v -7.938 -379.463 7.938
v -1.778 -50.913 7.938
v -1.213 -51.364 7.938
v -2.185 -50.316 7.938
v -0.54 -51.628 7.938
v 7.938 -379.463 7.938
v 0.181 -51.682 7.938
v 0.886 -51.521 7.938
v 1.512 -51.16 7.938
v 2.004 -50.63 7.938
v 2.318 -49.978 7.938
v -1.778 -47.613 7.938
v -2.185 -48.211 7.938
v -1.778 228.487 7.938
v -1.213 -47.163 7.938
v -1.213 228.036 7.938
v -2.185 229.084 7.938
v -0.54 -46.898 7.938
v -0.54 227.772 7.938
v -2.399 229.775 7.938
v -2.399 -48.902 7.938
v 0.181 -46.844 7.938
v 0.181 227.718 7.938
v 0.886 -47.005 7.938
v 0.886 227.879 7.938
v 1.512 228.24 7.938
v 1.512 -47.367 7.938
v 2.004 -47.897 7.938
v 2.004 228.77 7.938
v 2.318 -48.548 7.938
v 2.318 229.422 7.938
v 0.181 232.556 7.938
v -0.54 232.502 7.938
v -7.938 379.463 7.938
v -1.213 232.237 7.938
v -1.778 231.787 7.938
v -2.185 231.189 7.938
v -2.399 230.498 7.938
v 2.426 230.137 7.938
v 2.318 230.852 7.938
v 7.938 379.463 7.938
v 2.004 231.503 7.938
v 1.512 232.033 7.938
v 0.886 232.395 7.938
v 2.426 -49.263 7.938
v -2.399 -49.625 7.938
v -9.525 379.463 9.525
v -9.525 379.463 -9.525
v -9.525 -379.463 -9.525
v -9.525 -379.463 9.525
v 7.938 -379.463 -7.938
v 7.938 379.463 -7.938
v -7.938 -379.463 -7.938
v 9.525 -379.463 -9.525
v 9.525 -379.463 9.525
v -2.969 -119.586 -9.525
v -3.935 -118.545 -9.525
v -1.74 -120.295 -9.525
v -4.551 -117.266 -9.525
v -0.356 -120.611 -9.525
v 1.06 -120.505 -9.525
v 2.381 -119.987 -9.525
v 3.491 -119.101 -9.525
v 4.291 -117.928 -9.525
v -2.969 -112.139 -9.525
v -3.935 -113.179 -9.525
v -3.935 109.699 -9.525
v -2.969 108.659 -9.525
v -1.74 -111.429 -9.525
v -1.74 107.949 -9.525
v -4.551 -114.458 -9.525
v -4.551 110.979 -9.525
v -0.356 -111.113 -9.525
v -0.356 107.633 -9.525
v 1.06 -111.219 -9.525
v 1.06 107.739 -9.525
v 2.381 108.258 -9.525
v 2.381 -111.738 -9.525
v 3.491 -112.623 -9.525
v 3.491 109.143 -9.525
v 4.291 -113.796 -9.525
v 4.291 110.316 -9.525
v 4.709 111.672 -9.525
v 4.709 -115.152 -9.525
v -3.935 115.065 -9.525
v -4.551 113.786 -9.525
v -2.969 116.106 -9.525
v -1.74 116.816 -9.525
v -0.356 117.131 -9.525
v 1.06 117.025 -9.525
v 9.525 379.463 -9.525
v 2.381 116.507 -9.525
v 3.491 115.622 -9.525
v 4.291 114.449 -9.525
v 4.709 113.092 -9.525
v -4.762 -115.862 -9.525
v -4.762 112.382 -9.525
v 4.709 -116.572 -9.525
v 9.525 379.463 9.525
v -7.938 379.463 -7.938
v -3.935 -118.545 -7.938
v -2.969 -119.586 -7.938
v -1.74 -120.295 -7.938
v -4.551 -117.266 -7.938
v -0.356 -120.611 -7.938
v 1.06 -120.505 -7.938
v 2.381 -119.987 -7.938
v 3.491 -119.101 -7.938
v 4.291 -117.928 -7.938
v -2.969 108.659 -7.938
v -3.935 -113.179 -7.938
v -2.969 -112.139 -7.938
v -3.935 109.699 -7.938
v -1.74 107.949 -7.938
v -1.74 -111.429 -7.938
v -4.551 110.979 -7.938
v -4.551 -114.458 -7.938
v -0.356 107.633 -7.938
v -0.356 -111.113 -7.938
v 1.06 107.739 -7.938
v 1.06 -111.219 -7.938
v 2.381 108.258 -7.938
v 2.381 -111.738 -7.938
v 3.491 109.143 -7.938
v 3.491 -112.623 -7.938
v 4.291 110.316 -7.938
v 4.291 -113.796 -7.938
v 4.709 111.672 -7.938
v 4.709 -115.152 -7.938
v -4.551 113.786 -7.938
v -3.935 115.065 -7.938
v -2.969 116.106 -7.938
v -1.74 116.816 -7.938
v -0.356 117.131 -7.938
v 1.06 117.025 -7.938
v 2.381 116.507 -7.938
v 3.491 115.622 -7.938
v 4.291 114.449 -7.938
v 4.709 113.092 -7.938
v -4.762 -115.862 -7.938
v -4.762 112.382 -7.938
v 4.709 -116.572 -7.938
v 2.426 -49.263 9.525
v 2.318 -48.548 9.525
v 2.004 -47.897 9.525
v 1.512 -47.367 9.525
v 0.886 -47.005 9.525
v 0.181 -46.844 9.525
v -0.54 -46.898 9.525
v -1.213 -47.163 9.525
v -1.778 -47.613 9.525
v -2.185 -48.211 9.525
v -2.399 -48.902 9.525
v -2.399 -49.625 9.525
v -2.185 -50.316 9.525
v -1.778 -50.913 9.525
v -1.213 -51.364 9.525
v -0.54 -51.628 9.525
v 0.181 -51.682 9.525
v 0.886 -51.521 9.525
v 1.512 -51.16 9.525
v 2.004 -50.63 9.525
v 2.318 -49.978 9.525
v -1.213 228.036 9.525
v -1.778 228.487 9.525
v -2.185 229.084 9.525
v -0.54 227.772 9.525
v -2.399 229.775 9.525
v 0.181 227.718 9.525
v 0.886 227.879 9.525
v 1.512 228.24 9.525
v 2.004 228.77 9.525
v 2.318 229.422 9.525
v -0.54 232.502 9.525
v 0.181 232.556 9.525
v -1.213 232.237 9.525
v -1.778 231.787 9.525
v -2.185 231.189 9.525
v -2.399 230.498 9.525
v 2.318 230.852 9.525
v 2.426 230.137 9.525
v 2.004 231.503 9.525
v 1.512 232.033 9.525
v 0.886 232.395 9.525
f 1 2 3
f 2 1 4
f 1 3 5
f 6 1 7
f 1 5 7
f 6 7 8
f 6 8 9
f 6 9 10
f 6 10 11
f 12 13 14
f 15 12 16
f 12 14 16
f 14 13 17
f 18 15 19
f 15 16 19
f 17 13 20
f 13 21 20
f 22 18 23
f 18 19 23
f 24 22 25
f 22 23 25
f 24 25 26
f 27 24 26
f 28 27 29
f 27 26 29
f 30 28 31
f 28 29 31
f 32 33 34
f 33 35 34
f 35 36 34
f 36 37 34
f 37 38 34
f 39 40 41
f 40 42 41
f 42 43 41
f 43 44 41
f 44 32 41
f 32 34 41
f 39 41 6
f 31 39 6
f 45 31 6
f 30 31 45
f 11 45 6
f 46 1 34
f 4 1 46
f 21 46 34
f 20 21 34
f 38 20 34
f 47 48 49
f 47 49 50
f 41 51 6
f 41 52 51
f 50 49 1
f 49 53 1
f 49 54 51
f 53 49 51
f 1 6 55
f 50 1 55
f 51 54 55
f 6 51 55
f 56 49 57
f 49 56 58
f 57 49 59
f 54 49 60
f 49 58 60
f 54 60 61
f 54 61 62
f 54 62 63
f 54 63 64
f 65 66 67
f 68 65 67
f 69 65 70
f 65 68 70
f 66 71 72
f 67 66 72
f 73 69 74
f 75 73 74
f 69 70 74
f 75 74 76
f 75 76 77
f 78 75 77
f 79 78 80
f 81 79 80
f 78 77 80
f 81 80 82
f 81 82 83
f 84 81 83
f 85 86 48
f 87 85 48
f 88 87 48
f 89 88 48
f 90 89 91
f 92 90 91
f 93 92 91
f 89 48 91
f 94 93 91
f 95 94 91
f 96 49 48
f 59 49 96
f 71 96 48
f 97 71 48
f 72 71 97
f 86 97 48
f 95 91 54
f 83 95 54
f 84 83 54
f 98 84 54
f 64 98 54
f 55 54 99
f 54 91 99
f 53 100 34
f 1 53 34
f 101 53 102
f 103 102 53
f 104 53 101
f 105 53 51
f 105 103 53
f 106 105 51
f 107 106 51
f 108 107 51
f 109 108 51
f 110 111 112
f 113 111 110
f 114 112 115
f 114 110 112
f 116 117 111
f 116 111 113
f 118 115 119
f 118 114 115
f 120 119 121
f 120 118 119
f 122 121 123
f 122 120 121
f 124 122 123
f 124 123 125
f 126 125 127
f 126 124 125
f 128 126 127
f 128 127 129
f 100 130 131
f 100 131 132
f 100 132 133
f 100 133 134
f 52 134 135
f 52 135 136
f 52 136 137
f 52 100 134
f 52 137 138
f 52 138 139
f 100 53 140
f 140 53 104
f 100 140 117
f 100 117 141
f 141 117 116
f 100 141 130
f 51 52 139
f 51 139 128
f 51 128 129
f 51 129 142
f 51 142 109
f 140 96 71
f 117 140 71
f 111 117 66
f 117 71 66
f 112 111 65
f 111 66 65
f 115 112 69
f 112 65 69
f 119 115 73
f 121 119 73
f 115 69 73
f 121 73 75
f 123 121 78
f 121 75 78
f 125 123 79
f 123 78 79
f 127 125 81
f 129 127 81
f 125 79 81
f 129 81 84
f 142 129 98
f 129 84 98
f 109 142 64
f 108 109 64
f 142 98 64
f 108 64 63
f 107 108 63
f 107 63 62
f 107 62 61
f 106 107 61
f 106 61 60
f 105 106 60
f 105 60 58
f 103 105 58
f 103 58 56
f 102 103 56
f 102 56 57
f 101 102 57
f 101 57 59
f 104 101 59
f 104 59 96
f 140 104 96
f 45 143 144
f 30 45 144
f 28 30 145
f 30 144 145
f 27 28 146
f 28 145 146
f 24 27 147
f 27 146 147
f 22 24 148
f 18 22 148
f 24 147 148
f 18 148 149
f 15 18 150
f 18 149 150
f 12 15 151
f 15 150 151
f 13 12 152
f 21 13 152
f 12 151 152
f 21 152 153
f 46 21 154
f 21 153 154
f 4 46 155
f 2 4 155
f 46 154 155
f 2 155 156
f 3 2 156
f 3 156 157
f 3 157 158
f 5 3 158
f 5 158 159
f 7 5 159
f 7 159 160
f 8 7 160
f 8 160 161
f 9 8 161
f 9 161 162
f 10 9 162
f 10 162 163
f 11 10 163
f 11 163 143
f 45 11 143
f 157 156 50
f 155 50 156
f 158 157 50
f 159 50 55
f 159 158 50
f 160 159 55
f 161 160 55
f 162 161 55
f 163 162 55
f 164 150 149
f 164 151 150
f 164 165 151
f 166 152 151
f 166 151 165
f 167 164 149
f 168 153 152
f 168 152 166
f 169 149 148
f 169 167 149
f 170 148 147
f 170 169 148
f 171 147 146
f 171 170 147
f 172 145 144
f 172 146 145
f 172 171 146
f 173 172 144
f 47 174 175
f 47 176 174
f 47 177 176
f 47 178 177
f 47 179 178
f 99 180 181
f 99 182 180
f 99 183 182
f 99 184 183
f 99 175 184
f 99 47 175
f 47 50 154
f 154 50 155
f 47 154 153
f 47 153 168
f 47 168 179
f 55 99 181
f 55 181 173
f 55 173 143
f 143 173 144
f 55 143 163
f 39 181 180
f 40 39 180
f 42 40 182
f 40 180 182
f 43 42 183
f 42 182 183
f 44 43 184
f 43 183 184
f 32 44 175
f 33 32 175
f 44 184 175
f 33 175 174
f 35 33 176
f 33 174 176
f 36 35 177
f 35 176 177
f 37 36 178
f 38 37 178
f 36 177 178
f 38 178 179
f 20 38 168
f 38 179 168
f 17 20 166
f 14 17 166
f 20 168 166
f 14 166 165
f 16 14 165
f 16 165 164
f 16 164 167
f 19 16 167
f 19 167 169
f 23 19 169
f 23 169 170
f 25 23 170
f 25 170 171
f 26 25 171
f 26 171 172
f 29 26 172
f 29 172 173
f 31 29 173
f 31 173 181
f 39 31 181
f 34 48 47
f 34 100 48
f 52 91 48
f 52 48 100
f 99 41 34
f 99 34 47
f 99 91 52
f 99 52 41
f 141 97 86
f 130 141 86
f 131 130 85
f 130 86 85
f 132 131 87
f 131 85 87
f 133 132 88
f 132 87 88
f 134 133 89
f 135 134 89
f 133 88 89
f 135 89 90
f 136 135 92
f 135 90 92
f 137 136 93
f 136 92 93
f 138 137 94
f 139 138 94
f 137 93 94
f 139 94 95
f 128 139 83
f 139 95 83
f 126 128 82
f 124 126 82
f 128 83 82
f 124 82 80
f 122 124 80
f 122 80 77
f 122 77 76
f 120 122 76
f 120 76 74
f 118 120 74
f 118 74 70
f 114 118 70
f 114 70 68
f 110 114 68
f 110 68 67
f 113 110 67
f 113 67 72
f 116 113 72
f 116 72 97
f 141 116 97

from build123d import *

# Parameters (mm, degrees)
SKETCH1_W           = 19.05
SKETCH1_H           = 19.05
SKETCH1_W_2         = 15.875
SKETCH1_H_2         = 15.875
BOSS_EXTRUDE1_DEPTH = 379.4633
SHELF_HOLES_REACH   = 21.05
SKETCH2_R           = 2.4257
CUT_EXTRUDE1_REACH  = 21.05
SKETCH3_R           = 4.7625


with BuildPart() as part:
    # Sketch1 → Boss-Extrude1 (new body, symmetric)
    with BuildSketch(Plane.ZX):
        Rectangle(SKETCH1_W, SKETCH1_H)
        Rectangle(SKETCH1_W_2, SKETCH1_H_2, mode=Mode.SUBTRACT)
    extrude(amount=BOSS_EXTRUDE1_DEPTH, both=True)

    # Sketch2 → Shelf Holes (cut, up to next)
    with BuildSketch(Plane.XY.offset(9.525), mode=Mode.PRIVATE) as shelf_holes_sk1:
        with Locations((0, -49.2633)):
            Circle(SKETCH2_R)
    shelf_holes_tool1 = extrude(shelf_holes_sk1.sketch, amount=-SHELF_HOLES_REACH, mode=Mode.PRIVATE) & part.part
    add(shelf_holes_tool1.solids().sort_by_distance((0, -49.2633, 9.525))[0], mode=Mode.SUBTRACT)
    # Sketch2 → Shelf Holes (cut, up to next)
    with BuildSketch(Plane.XY.offset(9.525), mode=Mode.PRIVATE) as shelf_holes_sk2:
        with Locations((0, 230.1367)):
            Circle(SKETCH2_R)
    shelf_holes_tool2 = extrude(shelf_holes_sk2.sketch, amount=-SHELF_HOLES_REACH, mode=Mode.PRIVATE) & part.part
    add(shelf_holes_tool2.solids().sort_by_distance((0, 230.1367, 9.525))[0], mode=Mode.SUBTRACT)

    # Sketch3 → Cut-Extrude1 (cut, up to next)
    with BuildSketch(Plane(origin=(0, 0, -9.525), x_dir=(-1, 0, 0), z_dir=(0, 0, -1)), mode=Mode.PRIVATE) as cut_extrude1_sk1:
        with Locations((0, 112.3823)):
            Circle(SKETCH3_R)
    cut_extrude1_tool1 = extrude(cut_extrude1_sk1.sketch, amount=-CUT_EXTRUDE1_REACH, mode=Mode.PRIVATE) & part.part
    add(cut_extrude1_tool1.solids().sort_by_distance((0, 112.3823, -9.525))[0], mode=Mode.SUBTRACT)
    # Sketch3 → Cut-Extrude1 (cut, up to next)
    with BuildSketch(Plane(origin=(0, 0, -9.525), x_dir=(-1, 0, 0), z_dir=(0, 0, -1)), mode=Mode.PRIVATE) as cut_extrude1_sk2:
        with Locations((0, -115.8621)):
            Circle(SKETCH3_R)
    cut_extrude1_tool2 = extrude(cut_extrude1_sk2.sketch, amount=-CUT_EXTRUDE1_REACH, mode=Mode.PRIVATE) & part.part
    add(cut_extrude1_tool2.solids().sort_by_distance((0, -115.8621, -9.525))[0], mode=Mode.SUBTRACT)


solid = part.part
